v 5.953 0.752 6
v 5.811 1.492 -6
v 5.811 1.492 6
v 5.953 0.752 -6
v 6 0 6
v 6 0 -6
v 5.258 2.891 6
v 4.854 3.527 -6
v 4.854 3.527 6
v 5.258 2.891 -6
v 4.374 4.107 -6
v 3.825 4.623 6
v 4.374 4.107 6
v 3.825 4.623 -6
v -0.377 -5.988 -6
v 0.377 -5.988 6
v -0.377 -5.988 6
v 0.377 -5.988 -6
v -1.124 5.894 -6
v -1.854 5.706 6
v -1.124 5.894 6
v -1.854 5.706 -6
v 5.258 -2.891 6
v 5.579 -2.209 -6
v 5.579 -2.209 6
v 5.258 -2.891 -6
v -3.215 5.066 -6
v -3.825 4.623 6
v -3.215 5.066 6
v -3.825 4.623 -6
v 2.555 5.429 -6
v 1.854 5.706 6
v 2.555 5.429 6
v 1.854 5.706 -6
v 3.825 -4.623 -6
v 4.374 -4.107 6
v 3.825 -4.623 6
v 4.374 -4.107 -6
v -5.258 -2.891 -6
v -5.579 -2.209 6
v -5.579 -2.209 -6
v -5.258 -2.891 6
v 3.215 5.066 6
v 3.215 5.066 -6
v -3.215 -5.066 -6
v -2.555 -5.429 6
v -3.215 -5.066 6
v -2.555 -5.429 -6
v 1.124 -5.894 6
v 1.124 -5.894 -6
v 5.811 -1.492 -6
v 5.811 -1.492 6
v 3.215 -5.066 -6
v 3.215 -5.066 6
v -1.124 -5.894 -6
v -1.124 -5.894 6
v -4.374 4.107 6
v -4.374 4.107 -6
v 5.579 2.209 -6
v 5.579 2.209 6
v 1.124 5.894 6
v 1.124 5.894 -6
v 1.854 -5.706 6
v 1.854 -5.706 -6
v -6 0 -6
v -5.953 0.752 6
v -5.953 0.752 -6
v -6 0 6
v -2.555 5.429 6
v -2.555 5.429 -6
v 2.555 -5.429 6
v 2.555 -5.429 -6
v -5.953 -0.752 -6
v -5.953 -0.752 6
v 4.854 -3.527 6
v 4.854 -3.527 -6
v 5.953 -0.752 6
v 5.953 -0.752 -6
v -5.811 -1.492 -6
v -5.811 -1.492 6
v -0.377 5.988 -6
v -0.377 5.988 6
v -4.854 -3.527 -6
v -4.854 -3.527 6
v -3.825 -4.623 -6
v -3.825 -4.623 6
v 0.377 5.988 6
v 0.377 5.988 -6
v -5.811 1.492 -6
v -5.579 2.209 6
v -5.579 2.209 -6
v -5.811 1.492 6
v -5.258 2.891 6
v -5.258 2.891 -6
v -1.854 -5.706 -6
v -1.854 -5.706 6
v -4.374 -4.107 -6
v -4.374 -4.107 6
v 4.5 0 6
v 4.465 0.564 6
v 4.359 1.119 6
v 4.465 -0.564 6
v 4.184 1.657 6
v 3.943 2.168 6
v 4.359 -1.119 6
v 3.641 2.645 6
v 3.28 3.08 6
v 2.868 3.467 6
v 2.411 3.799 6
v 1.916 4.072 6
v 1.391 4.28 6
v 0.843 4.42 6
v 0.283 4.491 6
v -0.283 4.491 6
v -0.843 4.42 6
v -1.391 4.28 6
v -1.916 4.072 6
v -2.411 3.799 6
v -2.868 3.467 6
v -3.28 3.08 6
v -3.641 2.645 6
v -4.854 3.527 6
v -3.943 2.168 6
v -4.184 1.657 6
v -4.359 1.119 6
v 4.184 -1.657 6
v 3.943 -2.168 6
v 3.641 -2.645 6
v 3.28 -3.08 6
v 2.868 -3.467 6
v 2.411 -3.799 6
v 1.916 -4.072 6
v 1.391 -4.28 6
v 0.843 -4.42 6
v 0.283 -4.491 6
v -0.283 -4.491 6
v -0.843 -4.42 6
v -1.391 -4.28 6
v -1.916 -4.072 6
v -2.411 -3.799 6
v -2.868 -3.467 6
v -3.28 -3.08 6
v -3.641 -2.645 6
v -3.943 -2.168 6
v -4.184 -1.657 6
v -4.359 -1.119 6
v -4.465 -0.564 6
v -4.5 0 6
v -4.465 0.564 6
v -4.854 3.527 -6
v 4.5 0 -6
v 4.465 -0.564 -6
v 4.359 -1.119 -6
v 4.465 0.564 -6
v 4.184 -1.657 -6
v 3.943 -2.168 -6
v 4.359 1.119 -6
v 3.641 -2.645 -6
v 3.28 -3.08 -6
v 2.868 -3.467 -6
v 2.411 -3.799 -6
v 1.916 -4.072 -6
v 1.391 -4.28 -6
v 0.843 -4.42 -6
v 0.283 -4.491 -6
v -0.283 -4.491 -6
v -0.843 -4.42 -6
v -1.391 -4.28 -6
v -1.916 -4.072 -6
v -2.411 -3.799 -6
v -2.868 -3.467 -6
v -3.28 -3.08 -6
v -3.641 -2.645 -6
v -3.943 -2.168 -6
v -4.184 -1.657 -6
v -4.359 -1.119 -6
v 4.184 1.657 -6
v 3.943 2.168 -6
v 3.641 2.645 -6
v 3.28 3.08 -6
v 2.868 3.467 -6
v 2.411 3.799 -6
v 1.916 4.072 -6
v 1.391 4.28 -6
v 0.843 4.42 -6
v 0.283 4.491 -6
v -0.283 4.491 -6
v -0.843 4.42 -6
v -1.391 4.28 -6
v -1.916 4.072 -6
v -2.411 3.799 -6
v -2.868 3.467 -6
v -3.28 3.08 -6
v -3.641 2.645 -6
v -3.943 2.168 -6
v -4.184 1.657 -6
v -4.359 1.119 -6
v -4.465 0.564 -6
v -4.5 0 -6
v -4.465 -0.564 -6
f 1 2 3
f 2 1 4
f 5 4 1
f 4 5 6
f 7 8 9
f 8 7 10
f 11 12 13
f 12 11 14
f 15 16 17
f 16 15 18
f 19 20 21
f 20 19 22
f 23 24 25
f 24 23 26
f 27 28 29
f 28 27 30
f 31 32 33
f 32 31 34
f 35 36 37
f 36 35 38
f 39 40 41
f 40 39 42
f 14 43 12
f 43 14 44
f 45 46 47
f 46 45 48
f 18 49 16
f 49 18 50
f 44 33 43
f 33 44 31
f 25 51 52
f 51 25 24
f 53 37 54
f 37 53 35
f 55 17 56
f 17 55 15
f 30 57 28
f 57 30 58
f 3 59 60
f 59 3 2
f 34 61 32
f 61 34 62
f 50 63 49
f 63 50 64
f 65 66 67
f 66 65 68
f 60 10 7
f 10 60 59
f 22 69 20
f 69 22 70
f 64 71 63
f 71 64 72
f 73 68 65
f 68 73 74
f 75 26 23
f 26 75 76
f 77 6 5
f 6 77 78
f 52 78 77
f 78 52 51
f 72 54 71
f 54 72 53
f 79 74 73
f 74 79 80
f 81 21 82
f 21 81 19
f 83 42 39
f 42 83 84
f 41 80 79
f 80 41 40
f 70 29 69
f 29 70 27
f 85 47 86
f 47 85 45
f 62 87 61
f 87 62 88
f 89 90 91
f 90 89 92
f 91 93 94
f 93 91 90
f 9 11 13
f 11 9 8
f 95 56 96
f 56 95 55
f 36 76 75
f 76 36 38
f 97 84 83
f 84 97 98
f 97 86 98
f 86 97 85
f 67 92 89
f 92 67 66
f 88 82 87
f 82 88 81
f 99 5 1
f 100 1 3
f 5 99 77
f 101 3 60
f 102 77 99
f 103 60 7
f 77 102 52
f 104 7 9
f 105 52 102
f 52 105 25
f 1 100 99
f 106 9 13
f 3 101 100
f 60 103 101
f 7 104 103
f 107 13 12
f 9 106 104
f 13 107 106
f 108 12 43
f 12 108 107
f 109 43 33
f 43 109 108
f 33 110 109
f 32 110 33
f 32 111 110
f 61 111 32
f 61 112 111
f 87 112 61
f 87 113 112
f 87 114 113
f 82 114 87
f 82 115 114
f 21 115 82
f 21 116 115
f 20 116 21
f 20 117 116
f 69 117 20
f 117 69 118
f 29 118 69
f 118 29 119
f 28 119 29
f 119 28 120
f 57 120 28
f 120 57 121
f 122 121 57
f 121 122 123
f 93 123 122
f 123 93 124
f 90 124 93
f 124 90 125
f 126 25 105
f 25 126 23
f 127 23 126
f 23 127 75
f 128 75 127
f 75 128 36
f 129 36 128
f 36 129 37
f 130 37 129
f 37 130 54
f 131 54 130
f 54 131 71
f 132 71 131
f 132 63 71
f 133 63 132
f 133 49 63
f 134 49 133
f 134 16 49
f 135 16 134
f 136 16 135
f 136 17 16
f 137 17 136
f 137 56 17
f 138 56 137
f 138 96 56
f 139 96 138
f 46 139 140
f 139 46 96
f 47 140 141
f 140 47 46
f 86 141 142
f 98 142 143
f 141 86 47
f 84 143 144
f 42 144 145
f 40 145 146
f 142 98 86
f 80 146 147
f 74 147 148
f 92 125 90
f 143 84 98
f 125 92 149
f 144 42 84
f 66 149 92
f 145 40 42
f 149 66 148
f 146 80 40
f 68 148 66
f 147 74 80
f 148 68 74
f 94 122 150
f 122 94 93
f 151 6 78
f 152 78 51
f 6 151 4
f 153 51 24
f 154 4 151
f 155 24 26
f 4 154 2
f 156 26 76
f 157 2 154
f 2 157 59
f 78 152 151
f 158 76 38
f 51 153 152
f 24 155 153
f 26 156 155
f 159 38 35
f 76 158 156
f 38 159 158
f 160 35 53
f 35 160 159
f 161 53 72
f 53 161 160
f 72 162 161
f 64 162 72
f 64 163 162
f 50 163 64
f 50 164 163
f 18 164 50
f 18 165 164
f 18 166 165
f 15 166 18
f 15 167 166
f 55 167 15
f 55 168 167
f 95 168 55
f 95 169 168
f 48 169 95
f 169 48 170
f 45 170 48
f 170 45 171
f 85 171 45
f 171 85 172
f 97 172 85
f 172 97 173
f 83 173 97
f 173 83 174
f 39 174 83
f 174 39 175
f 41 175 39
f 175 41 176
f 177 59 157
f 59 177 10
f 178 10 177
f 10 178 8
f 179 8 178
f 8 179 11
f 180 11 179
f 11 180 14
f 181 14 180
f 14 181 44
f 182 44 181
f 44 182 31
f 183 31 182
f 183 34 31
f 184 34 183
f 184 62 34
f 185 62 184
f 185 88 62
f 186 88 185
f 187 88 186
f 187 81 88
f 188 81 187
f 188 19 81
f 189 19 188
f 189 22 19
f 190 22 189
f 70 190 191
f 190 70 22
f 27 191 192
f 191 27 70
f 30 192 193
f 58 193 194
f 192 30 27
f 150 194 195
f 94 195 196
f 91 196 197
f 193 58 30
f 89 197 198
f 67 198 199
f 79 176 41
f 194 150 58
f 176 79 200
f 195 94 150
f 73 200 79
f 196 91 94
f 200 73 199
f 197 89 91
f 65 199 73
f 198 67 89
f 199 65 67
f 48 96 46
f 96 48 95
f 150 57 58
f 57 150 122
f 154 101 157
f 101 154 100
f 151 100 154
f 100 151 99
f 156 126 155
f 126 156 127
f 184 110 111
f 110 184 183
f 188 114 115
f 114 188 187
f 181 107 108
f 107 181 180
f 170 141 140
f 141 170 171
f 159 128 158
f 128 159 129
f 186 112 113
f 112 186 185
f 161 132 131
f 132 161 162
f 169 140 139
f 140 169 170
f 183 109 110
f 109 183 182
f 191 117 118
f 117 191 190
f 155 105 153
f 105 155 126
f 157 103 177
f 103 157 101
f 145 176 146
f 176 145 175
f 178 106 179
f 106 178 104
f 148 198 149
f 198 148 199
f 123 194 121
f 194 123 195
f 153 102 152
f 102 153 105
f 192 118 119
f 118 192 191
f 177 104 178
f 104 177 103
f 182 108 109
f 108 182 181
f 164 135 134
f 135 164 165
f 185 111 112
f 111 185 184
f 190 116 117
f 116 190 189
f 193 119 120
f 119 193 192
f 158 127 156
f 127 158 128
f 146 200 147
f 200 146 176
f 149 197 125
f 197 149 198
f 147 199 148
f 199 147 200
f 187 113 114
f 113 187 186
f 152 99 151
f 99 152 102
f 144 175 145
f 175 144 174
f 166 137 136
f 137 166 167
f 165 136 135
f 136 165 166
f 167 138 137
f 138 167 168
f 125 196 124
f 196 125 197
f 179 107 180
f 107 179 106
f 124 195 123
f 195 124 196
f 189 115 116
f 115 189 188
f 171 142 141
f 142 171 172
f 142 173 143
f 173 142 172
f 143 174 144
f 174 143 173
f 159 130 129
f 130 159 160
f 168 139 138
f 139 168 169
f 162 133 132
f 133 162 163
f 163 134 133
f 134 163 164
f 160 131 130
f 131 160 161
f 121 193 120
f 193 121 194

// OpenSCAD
$fn = 50;


difference() {
	union() {
		translate(v = [0, 0, -6.0000000000]) {
			cylinder(h = 12, r = 6.0000000000);
		}
	}
	union() {
		translate(v = [0, 0, -100.0000000000]) {
			cylinder(h = 200, r = 4.5000000000);
		}
	}
}
